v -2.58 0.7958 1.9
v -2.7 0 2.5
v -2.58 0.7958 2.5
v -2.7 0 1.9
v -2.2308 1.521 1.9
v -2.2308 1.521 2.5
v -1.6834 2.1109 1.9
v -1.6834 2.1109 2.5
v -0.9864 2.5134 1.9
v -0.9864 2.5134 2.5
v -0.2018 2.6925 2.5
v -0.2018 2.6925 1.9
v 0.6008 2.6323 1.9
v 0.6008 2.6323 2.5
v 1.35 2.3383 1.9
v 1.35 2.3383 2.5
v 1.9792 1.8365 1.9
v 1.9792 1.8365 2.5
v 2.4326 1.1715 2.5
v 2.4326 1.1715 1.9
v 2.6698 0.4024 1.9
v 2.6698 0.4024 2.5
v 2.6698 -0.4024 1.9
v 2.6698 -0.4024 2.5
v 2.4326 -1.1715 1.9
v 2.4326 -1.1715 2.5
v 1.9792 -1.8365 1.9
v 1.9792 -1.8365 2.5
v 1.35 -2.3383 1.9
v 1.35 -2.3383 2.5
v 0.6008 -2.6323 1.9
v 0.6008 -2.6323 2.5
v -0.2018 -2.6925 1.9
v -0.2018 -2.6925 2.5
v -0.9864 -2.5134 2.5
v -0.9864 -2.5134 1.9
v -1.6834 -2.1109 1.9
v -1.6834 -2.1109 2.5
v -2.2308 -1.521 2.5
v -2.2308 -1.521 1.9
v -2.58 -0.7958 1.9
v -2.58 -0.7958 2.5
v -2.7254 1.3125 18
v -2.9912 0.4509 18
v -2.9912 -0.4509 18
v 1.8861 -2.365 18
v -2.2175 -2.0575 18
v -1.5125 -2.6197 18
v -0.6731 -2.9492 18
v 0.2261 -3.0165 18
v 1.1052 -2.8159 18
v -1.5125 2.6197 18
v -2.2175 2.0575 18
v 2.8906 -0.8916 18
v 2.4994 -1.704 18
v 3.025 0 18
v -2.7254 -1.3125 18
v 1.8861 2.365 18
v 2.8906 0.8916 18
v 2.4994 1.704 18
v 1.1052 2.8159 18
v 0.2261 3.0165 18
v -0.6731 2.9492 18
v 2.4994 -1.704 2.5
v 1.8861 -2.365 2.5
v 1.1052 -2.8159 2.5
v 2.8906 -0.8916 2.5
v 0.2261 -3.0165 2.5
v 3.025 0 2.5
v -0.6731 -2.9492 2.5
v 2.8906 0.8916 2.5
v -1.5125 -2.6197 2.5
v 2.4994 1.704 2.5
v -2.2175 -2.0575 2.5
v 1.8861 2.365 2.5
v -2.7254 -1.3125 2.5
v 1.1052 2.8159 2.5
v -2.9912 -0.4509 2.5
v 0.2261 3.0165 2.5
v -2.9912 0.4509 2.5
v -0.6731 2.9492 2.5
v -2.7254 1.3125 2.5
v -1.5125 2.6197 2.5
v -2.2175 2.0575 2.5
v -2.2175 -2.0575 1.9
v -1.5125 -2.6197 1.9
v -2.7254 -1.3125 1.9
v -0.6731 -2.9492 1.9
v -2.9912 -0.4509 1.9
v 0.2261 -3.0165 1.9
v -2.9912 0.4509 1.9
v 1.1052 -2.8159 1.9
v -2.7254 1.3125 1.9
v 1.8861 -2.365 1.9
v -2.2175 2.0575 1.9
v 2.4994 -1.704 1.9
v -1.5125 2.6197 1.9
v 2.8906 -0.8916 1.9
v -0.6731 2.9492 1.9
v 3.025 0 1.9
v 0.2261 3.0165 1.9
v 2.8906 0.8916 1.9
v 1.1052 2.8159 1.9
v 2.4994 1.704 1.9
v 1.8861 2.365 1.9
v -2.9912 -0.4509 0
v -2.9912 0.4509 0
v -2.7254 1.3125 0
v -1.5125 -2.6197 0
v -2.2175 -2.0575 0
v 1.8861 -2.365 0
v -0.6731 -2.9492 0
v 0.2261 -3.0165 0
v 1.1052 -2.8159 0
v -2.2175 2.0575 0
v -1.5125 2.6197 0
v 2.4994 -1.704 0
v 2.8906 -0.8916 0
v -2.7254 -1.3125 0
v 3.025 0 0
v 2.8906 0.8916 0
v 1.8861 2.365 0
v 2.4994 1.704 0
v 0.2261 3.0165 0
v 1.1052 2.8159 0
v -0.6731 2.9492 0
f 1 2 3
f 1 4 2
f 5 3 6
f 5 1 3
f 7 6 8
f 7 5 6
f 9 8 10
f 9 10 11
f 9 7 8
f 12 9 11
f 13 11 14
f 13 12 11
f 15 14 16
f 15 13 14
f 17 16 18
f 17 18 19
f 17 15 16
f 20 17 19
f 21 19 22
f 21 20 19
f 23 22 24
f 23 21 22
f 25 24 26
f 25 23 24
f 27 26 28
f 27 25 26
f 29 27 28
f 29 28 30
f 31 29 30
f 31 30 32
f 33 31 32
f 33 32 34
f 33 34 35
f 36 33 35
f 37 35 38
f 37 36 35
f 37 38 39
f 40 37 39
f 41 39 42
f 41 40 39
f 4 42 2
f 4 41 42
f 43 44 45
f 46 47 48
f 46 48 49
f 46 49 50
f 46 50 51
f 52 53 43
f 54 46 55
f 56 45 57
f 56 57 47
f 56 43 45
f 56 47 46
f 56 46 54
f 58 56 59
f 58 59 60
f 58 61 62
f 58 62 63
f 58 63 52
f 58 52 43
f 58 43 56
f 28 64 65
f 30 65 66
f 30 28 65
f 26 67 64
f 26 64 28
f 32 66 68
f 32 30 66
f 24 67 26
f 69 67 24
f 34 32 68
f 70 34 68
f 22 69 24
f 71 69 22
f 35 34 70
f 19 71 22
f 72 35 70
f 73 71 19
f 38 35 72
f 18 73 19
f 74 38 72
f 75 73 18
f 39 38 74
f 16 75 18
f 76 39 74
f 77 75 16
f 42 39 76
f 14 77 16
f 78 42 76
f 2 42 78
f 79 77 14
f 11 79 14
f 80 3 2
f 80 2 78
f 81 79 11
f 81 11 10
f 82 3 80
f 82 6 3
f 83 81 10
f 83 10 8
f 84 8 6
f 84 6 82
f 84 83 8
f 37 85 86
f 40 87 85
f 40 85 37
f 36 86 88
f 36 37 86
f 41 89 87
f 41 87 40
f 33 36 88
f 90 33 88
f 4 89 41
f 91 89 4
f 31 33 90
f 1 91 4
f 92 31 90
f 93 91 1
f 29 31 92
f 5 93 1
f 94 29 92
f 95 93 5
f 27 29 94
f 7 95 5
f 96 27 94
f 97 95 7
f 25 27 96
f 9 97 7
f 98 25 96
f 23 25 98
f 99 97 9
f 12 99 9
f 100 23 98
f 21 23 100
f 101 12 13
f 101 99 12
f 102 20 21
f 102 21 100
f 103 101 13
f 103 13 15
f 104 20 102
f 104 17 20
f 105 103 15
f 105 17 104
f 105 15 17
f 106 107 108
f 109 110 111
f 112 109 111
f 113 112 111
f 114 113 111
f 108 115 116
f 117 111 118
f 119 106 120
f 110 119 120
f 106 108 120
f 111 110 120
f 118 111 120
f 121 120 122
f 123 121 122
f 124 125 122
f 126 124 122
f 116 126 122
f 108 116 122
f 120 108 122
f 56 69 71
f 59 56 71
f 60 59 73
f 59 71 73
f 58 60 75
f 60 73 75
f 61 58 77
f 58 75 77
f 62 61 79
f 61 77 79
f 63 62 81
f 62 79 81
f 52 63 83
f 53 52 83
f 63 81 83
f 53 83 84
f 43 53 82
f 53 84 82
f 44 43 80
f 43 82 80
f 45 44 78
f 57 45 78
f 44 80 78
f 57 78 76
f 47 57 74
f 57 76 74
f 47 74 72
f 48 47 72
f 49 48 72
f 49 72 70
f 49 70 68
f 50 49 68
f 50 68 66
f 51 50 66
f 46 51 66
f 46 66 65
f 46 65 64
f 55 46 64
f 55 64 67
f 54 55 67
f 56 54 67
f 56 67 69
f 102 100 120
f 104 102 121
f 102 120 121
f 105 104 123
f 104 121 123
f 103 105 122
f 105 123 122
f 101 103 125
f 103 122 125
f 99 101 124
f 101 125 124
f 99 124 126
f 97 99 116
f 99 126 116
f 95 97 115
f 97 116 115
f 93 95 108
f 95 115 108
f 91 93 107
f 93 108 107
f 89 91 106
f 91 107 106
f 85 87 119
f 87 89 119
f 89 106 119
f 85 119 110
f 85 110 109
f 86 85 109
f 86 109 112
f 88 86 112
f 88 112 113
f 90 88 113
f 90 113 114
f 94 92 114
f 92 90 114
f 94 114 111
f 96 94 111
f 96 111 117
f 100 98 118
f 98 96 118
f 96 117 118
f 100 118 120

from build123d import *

# Parameters (mm, degrees)
SKETCH1_R           = 3.025
BOSS_EXTRUDE1_DEPTH = 18


with BuildPart() as part:
    # Sketch1 → Boss-Extrude1 (new body)
    with BuildSketch(Plane.XY):
        Circle(SKETCH1_R)
    extrude(amount=BOSS_EXTRUDE1_DEPTH)

    # Sketch3 → Groove for ANSI B27.7 - 3BM1-8, Basic Internal Retaining Ring1 (revolve, cut)
    with BuildSketch(Plane(origin=(0, 0, 18), x_dir=(0, 1, 0), z_dir=(-1, 0, 0)), mode=Mode.PRIVATE) as groove_for_ansi_b27_7_3bm1_8_basic_in_sk:
        with BuildLine():
            Line((4.1, 15.5), (2.7, 15.5))
            Line((2.7, 15.5), (2.7, 16.1))
            Line((2.7, 16.1), (4.1, 16.1))
            ThreePointArc((4.1, 16.1), (4.170710678, 16.070710678), (4.2, 16))
            Line((4.2, 16), (4.2, 15.6))
            ThreePointArc((4.2, 15.6), (4.170710678, 15.529289322), (4.1, 15.5))
        make_face()
    revolve(groove_for_ansi_b27_7_3bm1_8_basic_in_sk.sketch.rotate(Axis((0, 0, 68), (0, 0, -1)), 270), axis=Axis((0, 0, 68), (0, 0, -1)), mode=Mode.SUBTRACT)


solid = part.part
